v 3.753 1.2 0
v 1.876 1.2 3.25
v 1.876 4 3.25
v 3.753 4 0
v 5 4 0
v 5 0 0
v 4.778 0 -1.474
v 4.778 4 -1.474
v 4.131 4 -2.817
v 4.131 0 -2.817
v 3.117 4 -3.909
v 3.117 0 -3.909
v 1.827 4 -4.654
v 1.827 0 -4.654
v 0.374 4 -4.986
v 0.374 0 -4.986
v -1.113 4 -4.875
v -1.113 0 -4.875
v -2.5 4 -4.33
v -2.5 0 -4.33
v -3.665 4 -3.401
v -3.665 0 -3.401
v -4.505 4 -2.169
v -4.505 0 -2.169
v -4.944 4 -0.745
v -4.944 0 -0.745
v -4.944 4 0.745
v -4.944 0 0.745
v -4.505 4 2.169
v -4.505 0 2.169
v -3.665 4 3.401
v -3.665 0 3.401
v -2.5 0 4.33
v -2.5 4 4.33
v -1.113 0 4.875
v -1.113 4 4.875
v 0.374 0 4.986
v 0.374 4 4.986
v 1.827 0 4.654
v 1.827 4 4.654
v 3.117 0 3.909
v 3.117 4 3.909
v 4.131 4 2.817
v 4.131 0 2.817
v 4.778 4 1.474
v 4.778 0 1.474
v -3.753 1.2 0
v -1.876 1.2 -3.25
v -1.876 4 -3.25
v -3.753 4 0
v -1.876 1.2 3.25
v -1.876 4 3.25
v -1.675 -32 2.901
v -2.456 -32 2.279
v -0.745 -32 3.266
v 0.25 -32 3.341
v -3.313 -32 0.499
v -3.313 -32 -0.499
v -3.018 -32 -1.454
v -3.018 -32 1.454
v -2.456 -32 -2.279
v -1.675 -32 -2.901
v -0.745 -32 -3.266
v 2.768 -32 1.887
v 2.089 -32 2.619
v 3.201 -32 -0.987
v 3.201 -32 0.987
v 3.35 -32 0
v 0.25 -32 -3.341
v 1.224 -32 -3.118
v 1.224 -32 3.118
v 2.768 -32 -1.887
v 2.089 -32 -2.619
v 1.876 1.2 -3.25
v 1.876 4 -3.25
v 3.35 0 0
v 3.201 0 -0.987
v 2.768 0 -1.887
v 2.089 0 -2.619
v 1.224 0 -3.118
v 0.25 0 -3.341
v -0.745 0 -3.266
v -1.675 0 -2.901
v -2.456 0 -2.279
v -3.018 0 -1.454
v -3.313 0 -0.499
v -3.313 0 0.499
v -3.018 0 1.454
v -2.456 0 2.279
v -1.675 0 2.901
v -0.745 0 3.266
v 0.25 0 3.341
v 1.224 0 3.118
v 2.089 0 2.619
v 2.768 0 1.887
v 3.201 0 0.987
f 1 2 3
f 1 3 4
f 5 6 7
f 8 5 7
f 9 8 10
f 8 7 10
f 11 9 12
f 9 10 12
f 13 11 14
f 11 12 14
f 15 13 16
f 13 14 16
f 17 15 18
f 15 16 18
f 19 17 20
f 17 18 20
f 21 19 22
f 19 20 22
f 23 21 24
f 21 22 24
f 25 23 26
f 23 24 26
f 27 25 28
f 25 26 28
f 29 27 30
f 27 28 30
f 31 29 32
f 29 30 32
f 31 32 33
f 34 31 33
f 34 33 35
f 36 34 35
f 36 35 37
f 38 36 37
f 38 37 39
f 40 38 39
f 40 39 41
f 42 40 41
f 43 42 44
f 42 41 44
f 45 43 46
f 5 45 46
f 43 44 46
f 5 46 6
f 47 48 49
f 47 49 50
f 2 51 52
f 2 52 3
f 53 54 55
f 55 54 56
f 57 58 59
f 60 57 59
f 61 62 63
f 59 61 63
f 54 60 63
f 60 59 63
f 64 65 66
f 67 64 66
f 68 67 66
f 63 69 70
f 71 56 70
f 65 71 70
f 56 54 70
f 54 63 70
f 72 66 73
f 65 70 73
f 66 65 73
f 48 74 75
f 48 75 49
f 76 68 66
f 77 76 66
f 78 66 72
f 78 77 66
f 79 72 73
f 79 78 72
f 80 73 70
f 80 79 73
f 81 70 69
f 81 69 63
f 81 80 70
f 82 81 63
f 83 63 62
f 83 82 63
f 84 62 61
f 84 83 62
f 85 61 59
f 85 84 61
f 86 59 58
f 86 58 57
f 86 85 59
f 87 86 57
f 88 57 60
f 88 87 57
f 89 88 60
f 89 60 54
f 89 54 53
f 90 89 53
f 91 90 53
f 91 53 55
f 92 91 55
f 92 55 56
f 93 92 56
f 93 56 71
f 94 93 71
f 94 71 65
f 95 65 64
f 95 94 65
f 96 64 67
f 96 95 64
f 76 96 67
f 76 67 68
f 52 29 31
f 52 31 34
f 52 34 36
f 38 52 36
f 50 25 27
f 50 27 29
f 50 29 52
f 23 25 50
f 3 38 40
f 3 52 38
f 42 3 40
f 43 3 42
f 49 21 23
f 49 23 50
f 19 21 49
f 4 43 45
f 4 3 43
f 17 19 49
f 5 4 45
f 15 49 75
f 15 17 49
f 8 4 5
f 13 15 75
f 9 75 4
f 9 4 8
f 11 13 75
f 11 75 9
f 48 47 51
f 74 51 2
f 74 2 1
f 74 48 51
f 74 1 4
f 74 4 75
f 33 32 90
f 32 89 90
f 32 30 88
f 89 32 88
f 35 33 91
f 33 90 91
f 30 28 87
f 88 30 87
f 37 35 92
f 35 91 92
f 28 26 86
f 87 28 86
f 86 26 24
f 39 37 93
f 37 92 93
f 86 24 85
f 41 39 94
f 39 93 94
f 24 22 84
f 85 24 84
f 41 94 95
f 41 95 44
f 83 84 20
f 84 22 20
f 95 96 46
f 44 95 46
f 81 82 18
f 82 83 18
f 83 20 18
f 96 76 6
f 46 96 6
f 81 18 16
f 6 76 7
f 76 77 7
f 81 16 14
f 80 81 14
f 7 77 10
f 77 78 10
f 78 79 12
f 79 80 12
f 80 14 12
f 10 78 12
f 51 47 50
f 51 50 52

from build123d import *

# Parameters (mm, degrees)
CROQUIS1_R                 = 5
SALIENTE_EXTRUIR1_DEPTH    = 4
CROQUIS2_R                 = 3.35
SALIENTE_EXTRUIR2_DEPTH    = 32
CORTAR_EXTRUIR1_DEPTH      = 1.3
CORTAR_EXTRUIR1_DEPTH_BACK = 2.5


with BuildPart() as part:
    # Croquis1 → Saliente-Extruir1 (new body)
    with BuildSketch(Plane(origin=(0, 0, 0), x_dir=(1, 0, 0), z_dir=(0, 1, 0))):
        Circle(CROQUIS1_R)
    extrude(amount=SALIENTE_EXTRUIR1_DEPTH)

    # Croquis2 → Saliente-Extruir2 (add)
    with BuildSketch(Plane(origin=(0, 0, 0), x_dir=(1, 0, 0), z_dir=(0, 1, 0))):
        Circle(CROQUIS2_R)
    extrude(amount=-SALIENTE_EXTRUIR2_DEPTH)

    # Croquis4 → Cortar-Extruir1 (cut, two sides)
    with BuildSketch(Plane(origin=(0, 3.7, 0), x_dir=(1, 0, 0), z_dir=(0, 1, 0))) as cortar_extruir1_sk:
        Polygon((3.75277675, 0), (1.876388375, 3.25), (-1.876388375, 3.25), (-3.75277675, 0), (-1.876388375, -3.25), (1.876388375, -3.25), align=None)
    extrude(amount=CORTAR_EXTRUIR1_DEPTH, mode=Mode.SUBTRACT)
    extrude(cortar_extruir1_sk.sketch, amount=-CORTAR_EXTRUIR1_DEPTH_BACK, mode=Mode.SUBTRACT)


solid = part.part
